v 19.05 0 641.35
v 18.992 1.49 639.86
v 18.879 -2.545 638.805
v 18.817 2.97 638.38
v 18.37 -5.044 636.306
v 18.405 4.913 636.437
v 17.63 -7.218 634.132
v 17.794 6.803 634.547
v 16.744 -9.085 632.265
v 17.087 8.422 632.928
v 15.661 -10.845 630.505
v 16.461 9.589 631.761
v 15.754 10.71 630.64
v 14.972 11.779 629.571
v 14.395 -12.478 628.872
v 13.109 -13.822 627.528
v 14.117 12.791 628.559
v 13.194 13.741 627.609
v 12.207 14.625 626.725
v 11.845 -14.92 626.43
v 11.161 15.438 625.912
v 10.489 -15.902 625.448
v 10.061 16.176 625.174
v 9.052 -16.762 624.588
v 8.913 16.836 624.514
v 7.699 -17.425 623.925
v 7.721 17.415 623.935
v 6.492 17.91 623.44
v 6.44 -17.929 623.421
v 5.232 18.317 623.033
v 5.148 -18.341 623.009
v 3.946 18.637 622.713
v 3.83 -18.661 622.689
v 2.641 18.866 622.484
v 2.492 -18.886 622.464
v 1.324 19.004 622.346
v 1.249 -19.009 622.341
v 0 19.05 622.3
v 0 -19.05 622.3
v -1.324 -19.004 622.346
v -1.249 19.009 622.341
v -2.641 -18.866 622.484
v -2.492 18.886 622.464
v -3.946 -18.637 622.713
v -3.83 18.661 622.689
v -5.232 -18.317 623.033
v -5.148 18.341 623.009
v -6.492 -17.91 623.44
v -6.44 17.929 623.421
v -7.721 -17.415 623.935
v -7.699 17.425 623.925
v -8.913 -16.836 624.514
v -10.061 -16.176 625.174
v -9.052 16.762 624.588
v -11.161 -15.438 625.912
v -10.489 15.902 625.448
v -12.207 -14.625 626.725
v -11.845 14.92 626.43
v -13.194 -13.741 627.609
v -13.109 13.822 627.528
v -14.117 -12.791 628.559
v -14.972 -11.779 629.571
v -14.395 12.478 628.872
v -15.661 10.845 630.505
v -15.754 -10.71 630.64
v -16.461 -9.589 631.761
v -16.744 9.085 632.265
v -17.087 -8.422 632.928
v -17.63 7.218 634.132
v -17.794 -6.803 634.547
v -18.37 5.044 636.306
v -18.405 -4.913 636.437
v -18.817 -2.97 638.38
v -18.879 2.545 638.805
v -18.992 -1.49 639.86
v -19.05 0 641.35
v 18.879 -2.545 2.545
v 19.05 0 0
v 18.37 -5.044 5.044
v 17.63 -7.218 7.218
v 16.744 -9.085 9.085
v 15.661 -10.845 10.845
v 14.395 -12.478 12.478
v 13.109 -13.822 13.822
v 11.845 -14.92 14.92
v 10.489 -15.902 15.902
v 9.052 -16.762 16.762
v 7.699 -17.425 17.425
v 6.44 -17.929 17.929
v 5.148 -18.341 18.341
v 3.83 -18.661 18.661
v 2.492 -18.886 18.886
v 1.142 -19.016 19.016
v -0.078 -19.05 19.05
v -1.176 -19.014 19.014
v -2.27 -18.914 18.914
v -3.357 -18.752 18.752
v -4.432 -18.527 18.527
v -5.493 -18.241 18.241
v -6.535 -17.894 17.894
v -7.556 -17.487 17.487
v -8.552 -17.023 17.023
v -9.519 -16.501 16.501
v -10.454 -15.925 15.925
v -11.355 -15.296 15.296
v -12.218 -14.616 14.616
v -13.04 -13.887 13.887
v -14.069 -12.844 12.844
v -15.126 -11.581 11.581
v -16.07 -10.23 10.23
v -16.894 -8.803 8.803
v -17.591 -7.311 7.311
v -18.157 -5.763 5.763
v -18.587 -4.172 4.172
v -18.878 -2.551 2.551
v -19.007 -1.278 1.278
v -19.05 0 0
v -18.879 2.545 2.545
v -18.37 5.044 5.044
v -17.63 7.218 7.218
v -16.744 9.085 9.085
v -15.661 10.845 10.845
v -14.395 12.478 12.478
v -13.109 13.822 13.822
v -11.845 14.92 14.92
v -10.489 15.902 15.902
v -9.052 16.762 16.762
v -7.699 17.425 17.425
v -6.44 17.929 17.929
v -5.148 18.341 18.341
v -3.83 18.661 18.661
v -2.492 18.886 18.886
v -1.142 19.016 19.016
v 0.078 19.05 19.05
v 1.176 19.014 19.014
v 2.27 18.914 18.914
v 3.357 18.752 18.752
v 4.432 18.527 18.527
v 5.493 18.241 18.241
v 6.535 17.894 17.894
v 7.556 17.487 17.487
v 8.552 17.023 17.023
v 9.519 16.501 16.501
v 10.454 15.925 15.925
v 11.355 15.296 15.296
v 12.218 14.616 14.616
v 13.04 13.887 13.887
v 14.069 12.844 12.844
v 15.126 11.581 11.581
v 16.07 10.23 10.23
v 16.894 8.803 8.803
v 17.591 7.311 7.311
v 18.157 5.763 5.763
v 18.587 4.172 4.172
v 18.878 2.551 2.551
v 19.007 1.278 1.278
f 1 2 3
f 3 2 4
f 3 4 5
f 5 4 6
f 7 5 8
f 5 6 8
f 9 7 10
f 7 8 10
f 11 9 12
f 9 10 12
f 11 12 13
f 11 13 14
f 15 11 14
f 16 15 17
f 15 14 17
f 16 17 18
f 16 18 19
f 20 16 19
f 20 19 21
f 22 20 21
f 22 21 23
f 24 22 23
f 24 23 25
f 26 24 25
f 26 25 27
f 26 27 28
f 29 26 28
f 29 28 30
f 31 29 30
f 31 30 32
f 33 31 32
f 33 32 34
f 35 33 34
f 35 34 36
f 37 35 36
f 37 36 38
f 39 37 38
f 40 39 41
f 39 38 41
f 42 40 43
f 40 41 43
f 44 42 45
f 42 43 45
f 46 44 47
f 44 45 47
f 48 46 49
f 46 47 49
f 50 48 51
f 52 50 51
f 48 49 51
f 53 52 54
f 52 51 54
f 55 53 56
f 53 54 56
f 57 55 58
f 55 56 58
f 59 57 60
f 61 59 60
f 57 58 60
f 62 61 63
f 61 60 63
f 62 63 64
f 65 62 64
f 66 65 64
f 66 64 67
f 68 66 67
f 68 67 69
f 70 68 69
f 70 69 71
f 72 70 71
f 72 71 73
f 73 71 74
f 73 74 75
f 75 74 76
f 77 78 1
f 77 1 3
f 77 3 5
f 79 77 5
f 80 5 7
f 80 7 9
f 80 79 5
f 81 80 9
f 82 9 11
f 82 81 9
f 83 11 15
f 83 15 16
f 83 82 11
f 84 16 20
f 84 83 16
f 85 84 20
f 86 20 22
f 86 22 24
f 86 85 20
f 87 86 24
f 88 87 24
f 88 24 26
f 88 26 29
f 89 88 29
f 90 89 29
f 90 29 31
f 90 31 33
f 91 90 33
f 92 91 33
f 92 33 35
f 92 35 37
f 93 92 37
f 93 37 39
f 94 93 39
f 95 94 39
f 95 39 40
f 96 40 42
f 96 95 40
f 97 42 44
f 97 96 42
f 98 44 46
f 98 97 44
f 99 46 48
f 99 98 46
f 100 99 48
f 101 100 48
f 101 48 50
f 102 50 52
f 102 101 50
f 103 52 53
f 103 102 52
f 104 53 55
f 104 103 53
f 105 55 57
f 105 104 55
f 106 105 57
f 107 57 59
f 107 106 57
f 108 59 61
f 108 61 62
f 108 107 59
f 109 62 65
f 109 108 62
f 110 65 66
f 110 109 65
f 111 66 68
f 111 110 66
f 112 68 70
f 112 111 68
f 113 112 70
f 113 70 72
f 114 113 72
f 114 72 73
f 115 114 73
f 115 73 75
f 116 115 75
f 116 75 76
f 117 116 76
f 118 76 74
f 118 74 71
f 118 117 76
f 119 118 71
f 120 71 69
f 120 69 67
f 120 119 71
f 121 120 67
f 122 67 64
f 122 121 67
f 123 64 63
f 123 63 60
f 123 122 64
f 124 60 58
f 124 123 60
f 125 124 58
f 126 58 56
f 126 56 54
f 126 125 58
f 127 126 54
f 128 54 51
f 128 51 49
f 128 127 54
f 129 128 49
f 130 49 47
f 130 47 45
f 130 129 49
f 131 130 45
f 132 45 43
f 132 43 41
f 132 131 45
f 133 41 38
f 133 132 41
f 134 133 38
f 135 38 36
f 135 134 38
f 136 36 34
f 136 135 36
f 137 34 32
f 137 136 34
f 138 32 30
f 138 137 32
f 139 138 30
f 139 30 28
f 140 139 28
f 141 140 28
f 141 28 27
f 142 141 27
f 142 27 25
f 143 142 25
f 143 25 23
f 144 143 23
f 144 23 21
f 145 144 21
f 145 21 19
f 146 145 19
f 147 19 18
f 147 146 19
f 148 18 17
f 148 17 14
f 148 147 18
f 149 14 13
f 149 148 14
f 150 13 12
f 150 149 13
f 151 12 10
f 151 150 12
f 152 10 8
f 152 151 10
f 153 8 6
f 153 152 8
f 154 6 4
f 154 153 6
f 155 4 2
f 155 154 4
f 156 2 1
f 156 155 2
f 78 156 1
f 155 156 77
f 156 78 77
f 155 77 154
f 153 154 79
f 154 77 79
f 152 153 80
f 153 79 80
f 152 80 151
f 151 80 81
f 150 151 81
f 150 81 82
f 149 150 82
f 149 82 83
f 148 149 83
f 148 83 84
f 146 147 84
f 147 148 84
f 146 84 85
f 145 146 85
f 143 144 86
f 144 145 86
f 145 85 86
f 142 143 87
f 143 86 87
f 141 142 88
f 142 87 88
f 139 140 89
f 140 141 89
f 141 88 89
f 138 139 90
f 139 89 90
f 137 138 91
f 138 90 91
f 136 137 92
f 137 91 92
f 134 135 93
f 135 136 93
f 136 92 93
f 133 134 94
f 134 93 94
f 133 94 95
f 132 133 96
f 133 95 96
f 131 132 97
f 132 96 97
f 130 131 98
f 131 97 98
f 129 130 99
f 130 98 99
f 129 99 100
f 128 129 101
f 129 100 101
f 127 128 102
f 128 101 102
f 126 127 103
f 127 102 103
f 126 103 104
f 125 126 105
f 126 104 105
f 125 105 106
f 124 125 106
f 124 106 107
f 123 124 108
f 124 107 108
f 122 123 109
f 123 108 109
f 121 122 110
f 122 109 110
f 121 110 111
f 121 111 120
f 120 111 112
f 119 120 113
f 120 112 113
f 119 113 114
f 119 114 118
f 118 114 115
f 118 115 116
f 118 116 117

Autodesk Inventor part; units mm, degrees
ref_plane "Start plane" through (0, 0, 0) normal (0, 0, 1) x (1, 0, 0)
ref_plane "End plane" through (0, 0, 641.35) normal (0, 0, 1) x (1, 0, 0)
sketch "Sketch" plane through (0, 0, 0) normal (0, 0, 1) x (1, 0, 0)
  circle A0 centre (0, 0) radius 19.05
  dimension "d0" = 38.1
extrude "Body" add sketch "Sketch" along normal up to surface (641.35 mm away) from surface at 0
sketch "Sketch2" plane through (0, 0, 0) normal (0, 0, 1) x (1, 0, 0)
  line L0 (0, 0) -> (10, 0)
ref_plane "Work Plane3" through (0, 0, 0) normal (0, -1, 0) x (1, 0, 0)
sketch "Sketch3" plane through (0, 0, 0) normal (0, -1, 0) x (1, 0, 0)
  line L0 (-2, 0) -> (12, 0)
  line L1 (-2, 641.35) -> (12, 641.35)
  dimension "d7" = 641.35
ref_plane "Work Plane4" through (0, 339.725, 660.4) normal (0, 0.7071, -0.7071) x (1, 0, 0)
ref_plane "Work Plane5" through (0, -339.725, 660.4) normal (0, -0.7071, -0.7071) x (1, 0, 0)
ref_plane "Work Plane6" through (0, 0, 641.35) normal (0, -1, 0) x (1, 0, 0)
sketch "Sketch4" plane through (0, 0, 641.35) normal (0, -1, 0) x (1, 0, 0)
  circle A0 centre (0, 0) radius 19.05
extrude "Extrusion2" cut sketch "Sketch4" along normal up to surface from surface at -339.725 surface through (0, -339.725, 660.4) normal (0, -0.7071, -0.7071)
ref_plane "Work Plane7" through (0, -339.725, -19.05) normal (0, -0.7071, 0.7071) x (1, 0, 0)
ref_plane "Work Plane8" through (0, 339.725, -19.05) normal (0, 0.7071, 0.7071) x (1, 0, 0)
ref_plane "Work Plane9" through (0, 0, 0) normal (0, 1, 0) x (1, 0, 0)
sketch "Sketch5" plane through (0, 0, 0) normal (0, 1, 0) x (1, 0, 0)
  circle A0 centre (0, 0) radius 19.05
extrude "Extrusion3" cut sketch "Sketch5" along normal up to surface from surface at -339.725 surface through (0, 339.725, -19.05) normal (0, 0.7071, 0.7071)
equation "\"d0\" = Diam"
equation "\"d1\" = G_L"
equation "\"Diam\" = 38.1"
equation "\"G_L\" = d7"
equation "\"G_OFFSET_START\" = 0"
equation "\"G_OFFSET_END\" = 0"
equation "\"d5\" = G_OFFSET_END + B_L"
equation "\"B_L\" = 641.35"
properties part number "ANSI/AISC Rolled Steel - 1 1/2-25.25" material "Steel, Mild"
